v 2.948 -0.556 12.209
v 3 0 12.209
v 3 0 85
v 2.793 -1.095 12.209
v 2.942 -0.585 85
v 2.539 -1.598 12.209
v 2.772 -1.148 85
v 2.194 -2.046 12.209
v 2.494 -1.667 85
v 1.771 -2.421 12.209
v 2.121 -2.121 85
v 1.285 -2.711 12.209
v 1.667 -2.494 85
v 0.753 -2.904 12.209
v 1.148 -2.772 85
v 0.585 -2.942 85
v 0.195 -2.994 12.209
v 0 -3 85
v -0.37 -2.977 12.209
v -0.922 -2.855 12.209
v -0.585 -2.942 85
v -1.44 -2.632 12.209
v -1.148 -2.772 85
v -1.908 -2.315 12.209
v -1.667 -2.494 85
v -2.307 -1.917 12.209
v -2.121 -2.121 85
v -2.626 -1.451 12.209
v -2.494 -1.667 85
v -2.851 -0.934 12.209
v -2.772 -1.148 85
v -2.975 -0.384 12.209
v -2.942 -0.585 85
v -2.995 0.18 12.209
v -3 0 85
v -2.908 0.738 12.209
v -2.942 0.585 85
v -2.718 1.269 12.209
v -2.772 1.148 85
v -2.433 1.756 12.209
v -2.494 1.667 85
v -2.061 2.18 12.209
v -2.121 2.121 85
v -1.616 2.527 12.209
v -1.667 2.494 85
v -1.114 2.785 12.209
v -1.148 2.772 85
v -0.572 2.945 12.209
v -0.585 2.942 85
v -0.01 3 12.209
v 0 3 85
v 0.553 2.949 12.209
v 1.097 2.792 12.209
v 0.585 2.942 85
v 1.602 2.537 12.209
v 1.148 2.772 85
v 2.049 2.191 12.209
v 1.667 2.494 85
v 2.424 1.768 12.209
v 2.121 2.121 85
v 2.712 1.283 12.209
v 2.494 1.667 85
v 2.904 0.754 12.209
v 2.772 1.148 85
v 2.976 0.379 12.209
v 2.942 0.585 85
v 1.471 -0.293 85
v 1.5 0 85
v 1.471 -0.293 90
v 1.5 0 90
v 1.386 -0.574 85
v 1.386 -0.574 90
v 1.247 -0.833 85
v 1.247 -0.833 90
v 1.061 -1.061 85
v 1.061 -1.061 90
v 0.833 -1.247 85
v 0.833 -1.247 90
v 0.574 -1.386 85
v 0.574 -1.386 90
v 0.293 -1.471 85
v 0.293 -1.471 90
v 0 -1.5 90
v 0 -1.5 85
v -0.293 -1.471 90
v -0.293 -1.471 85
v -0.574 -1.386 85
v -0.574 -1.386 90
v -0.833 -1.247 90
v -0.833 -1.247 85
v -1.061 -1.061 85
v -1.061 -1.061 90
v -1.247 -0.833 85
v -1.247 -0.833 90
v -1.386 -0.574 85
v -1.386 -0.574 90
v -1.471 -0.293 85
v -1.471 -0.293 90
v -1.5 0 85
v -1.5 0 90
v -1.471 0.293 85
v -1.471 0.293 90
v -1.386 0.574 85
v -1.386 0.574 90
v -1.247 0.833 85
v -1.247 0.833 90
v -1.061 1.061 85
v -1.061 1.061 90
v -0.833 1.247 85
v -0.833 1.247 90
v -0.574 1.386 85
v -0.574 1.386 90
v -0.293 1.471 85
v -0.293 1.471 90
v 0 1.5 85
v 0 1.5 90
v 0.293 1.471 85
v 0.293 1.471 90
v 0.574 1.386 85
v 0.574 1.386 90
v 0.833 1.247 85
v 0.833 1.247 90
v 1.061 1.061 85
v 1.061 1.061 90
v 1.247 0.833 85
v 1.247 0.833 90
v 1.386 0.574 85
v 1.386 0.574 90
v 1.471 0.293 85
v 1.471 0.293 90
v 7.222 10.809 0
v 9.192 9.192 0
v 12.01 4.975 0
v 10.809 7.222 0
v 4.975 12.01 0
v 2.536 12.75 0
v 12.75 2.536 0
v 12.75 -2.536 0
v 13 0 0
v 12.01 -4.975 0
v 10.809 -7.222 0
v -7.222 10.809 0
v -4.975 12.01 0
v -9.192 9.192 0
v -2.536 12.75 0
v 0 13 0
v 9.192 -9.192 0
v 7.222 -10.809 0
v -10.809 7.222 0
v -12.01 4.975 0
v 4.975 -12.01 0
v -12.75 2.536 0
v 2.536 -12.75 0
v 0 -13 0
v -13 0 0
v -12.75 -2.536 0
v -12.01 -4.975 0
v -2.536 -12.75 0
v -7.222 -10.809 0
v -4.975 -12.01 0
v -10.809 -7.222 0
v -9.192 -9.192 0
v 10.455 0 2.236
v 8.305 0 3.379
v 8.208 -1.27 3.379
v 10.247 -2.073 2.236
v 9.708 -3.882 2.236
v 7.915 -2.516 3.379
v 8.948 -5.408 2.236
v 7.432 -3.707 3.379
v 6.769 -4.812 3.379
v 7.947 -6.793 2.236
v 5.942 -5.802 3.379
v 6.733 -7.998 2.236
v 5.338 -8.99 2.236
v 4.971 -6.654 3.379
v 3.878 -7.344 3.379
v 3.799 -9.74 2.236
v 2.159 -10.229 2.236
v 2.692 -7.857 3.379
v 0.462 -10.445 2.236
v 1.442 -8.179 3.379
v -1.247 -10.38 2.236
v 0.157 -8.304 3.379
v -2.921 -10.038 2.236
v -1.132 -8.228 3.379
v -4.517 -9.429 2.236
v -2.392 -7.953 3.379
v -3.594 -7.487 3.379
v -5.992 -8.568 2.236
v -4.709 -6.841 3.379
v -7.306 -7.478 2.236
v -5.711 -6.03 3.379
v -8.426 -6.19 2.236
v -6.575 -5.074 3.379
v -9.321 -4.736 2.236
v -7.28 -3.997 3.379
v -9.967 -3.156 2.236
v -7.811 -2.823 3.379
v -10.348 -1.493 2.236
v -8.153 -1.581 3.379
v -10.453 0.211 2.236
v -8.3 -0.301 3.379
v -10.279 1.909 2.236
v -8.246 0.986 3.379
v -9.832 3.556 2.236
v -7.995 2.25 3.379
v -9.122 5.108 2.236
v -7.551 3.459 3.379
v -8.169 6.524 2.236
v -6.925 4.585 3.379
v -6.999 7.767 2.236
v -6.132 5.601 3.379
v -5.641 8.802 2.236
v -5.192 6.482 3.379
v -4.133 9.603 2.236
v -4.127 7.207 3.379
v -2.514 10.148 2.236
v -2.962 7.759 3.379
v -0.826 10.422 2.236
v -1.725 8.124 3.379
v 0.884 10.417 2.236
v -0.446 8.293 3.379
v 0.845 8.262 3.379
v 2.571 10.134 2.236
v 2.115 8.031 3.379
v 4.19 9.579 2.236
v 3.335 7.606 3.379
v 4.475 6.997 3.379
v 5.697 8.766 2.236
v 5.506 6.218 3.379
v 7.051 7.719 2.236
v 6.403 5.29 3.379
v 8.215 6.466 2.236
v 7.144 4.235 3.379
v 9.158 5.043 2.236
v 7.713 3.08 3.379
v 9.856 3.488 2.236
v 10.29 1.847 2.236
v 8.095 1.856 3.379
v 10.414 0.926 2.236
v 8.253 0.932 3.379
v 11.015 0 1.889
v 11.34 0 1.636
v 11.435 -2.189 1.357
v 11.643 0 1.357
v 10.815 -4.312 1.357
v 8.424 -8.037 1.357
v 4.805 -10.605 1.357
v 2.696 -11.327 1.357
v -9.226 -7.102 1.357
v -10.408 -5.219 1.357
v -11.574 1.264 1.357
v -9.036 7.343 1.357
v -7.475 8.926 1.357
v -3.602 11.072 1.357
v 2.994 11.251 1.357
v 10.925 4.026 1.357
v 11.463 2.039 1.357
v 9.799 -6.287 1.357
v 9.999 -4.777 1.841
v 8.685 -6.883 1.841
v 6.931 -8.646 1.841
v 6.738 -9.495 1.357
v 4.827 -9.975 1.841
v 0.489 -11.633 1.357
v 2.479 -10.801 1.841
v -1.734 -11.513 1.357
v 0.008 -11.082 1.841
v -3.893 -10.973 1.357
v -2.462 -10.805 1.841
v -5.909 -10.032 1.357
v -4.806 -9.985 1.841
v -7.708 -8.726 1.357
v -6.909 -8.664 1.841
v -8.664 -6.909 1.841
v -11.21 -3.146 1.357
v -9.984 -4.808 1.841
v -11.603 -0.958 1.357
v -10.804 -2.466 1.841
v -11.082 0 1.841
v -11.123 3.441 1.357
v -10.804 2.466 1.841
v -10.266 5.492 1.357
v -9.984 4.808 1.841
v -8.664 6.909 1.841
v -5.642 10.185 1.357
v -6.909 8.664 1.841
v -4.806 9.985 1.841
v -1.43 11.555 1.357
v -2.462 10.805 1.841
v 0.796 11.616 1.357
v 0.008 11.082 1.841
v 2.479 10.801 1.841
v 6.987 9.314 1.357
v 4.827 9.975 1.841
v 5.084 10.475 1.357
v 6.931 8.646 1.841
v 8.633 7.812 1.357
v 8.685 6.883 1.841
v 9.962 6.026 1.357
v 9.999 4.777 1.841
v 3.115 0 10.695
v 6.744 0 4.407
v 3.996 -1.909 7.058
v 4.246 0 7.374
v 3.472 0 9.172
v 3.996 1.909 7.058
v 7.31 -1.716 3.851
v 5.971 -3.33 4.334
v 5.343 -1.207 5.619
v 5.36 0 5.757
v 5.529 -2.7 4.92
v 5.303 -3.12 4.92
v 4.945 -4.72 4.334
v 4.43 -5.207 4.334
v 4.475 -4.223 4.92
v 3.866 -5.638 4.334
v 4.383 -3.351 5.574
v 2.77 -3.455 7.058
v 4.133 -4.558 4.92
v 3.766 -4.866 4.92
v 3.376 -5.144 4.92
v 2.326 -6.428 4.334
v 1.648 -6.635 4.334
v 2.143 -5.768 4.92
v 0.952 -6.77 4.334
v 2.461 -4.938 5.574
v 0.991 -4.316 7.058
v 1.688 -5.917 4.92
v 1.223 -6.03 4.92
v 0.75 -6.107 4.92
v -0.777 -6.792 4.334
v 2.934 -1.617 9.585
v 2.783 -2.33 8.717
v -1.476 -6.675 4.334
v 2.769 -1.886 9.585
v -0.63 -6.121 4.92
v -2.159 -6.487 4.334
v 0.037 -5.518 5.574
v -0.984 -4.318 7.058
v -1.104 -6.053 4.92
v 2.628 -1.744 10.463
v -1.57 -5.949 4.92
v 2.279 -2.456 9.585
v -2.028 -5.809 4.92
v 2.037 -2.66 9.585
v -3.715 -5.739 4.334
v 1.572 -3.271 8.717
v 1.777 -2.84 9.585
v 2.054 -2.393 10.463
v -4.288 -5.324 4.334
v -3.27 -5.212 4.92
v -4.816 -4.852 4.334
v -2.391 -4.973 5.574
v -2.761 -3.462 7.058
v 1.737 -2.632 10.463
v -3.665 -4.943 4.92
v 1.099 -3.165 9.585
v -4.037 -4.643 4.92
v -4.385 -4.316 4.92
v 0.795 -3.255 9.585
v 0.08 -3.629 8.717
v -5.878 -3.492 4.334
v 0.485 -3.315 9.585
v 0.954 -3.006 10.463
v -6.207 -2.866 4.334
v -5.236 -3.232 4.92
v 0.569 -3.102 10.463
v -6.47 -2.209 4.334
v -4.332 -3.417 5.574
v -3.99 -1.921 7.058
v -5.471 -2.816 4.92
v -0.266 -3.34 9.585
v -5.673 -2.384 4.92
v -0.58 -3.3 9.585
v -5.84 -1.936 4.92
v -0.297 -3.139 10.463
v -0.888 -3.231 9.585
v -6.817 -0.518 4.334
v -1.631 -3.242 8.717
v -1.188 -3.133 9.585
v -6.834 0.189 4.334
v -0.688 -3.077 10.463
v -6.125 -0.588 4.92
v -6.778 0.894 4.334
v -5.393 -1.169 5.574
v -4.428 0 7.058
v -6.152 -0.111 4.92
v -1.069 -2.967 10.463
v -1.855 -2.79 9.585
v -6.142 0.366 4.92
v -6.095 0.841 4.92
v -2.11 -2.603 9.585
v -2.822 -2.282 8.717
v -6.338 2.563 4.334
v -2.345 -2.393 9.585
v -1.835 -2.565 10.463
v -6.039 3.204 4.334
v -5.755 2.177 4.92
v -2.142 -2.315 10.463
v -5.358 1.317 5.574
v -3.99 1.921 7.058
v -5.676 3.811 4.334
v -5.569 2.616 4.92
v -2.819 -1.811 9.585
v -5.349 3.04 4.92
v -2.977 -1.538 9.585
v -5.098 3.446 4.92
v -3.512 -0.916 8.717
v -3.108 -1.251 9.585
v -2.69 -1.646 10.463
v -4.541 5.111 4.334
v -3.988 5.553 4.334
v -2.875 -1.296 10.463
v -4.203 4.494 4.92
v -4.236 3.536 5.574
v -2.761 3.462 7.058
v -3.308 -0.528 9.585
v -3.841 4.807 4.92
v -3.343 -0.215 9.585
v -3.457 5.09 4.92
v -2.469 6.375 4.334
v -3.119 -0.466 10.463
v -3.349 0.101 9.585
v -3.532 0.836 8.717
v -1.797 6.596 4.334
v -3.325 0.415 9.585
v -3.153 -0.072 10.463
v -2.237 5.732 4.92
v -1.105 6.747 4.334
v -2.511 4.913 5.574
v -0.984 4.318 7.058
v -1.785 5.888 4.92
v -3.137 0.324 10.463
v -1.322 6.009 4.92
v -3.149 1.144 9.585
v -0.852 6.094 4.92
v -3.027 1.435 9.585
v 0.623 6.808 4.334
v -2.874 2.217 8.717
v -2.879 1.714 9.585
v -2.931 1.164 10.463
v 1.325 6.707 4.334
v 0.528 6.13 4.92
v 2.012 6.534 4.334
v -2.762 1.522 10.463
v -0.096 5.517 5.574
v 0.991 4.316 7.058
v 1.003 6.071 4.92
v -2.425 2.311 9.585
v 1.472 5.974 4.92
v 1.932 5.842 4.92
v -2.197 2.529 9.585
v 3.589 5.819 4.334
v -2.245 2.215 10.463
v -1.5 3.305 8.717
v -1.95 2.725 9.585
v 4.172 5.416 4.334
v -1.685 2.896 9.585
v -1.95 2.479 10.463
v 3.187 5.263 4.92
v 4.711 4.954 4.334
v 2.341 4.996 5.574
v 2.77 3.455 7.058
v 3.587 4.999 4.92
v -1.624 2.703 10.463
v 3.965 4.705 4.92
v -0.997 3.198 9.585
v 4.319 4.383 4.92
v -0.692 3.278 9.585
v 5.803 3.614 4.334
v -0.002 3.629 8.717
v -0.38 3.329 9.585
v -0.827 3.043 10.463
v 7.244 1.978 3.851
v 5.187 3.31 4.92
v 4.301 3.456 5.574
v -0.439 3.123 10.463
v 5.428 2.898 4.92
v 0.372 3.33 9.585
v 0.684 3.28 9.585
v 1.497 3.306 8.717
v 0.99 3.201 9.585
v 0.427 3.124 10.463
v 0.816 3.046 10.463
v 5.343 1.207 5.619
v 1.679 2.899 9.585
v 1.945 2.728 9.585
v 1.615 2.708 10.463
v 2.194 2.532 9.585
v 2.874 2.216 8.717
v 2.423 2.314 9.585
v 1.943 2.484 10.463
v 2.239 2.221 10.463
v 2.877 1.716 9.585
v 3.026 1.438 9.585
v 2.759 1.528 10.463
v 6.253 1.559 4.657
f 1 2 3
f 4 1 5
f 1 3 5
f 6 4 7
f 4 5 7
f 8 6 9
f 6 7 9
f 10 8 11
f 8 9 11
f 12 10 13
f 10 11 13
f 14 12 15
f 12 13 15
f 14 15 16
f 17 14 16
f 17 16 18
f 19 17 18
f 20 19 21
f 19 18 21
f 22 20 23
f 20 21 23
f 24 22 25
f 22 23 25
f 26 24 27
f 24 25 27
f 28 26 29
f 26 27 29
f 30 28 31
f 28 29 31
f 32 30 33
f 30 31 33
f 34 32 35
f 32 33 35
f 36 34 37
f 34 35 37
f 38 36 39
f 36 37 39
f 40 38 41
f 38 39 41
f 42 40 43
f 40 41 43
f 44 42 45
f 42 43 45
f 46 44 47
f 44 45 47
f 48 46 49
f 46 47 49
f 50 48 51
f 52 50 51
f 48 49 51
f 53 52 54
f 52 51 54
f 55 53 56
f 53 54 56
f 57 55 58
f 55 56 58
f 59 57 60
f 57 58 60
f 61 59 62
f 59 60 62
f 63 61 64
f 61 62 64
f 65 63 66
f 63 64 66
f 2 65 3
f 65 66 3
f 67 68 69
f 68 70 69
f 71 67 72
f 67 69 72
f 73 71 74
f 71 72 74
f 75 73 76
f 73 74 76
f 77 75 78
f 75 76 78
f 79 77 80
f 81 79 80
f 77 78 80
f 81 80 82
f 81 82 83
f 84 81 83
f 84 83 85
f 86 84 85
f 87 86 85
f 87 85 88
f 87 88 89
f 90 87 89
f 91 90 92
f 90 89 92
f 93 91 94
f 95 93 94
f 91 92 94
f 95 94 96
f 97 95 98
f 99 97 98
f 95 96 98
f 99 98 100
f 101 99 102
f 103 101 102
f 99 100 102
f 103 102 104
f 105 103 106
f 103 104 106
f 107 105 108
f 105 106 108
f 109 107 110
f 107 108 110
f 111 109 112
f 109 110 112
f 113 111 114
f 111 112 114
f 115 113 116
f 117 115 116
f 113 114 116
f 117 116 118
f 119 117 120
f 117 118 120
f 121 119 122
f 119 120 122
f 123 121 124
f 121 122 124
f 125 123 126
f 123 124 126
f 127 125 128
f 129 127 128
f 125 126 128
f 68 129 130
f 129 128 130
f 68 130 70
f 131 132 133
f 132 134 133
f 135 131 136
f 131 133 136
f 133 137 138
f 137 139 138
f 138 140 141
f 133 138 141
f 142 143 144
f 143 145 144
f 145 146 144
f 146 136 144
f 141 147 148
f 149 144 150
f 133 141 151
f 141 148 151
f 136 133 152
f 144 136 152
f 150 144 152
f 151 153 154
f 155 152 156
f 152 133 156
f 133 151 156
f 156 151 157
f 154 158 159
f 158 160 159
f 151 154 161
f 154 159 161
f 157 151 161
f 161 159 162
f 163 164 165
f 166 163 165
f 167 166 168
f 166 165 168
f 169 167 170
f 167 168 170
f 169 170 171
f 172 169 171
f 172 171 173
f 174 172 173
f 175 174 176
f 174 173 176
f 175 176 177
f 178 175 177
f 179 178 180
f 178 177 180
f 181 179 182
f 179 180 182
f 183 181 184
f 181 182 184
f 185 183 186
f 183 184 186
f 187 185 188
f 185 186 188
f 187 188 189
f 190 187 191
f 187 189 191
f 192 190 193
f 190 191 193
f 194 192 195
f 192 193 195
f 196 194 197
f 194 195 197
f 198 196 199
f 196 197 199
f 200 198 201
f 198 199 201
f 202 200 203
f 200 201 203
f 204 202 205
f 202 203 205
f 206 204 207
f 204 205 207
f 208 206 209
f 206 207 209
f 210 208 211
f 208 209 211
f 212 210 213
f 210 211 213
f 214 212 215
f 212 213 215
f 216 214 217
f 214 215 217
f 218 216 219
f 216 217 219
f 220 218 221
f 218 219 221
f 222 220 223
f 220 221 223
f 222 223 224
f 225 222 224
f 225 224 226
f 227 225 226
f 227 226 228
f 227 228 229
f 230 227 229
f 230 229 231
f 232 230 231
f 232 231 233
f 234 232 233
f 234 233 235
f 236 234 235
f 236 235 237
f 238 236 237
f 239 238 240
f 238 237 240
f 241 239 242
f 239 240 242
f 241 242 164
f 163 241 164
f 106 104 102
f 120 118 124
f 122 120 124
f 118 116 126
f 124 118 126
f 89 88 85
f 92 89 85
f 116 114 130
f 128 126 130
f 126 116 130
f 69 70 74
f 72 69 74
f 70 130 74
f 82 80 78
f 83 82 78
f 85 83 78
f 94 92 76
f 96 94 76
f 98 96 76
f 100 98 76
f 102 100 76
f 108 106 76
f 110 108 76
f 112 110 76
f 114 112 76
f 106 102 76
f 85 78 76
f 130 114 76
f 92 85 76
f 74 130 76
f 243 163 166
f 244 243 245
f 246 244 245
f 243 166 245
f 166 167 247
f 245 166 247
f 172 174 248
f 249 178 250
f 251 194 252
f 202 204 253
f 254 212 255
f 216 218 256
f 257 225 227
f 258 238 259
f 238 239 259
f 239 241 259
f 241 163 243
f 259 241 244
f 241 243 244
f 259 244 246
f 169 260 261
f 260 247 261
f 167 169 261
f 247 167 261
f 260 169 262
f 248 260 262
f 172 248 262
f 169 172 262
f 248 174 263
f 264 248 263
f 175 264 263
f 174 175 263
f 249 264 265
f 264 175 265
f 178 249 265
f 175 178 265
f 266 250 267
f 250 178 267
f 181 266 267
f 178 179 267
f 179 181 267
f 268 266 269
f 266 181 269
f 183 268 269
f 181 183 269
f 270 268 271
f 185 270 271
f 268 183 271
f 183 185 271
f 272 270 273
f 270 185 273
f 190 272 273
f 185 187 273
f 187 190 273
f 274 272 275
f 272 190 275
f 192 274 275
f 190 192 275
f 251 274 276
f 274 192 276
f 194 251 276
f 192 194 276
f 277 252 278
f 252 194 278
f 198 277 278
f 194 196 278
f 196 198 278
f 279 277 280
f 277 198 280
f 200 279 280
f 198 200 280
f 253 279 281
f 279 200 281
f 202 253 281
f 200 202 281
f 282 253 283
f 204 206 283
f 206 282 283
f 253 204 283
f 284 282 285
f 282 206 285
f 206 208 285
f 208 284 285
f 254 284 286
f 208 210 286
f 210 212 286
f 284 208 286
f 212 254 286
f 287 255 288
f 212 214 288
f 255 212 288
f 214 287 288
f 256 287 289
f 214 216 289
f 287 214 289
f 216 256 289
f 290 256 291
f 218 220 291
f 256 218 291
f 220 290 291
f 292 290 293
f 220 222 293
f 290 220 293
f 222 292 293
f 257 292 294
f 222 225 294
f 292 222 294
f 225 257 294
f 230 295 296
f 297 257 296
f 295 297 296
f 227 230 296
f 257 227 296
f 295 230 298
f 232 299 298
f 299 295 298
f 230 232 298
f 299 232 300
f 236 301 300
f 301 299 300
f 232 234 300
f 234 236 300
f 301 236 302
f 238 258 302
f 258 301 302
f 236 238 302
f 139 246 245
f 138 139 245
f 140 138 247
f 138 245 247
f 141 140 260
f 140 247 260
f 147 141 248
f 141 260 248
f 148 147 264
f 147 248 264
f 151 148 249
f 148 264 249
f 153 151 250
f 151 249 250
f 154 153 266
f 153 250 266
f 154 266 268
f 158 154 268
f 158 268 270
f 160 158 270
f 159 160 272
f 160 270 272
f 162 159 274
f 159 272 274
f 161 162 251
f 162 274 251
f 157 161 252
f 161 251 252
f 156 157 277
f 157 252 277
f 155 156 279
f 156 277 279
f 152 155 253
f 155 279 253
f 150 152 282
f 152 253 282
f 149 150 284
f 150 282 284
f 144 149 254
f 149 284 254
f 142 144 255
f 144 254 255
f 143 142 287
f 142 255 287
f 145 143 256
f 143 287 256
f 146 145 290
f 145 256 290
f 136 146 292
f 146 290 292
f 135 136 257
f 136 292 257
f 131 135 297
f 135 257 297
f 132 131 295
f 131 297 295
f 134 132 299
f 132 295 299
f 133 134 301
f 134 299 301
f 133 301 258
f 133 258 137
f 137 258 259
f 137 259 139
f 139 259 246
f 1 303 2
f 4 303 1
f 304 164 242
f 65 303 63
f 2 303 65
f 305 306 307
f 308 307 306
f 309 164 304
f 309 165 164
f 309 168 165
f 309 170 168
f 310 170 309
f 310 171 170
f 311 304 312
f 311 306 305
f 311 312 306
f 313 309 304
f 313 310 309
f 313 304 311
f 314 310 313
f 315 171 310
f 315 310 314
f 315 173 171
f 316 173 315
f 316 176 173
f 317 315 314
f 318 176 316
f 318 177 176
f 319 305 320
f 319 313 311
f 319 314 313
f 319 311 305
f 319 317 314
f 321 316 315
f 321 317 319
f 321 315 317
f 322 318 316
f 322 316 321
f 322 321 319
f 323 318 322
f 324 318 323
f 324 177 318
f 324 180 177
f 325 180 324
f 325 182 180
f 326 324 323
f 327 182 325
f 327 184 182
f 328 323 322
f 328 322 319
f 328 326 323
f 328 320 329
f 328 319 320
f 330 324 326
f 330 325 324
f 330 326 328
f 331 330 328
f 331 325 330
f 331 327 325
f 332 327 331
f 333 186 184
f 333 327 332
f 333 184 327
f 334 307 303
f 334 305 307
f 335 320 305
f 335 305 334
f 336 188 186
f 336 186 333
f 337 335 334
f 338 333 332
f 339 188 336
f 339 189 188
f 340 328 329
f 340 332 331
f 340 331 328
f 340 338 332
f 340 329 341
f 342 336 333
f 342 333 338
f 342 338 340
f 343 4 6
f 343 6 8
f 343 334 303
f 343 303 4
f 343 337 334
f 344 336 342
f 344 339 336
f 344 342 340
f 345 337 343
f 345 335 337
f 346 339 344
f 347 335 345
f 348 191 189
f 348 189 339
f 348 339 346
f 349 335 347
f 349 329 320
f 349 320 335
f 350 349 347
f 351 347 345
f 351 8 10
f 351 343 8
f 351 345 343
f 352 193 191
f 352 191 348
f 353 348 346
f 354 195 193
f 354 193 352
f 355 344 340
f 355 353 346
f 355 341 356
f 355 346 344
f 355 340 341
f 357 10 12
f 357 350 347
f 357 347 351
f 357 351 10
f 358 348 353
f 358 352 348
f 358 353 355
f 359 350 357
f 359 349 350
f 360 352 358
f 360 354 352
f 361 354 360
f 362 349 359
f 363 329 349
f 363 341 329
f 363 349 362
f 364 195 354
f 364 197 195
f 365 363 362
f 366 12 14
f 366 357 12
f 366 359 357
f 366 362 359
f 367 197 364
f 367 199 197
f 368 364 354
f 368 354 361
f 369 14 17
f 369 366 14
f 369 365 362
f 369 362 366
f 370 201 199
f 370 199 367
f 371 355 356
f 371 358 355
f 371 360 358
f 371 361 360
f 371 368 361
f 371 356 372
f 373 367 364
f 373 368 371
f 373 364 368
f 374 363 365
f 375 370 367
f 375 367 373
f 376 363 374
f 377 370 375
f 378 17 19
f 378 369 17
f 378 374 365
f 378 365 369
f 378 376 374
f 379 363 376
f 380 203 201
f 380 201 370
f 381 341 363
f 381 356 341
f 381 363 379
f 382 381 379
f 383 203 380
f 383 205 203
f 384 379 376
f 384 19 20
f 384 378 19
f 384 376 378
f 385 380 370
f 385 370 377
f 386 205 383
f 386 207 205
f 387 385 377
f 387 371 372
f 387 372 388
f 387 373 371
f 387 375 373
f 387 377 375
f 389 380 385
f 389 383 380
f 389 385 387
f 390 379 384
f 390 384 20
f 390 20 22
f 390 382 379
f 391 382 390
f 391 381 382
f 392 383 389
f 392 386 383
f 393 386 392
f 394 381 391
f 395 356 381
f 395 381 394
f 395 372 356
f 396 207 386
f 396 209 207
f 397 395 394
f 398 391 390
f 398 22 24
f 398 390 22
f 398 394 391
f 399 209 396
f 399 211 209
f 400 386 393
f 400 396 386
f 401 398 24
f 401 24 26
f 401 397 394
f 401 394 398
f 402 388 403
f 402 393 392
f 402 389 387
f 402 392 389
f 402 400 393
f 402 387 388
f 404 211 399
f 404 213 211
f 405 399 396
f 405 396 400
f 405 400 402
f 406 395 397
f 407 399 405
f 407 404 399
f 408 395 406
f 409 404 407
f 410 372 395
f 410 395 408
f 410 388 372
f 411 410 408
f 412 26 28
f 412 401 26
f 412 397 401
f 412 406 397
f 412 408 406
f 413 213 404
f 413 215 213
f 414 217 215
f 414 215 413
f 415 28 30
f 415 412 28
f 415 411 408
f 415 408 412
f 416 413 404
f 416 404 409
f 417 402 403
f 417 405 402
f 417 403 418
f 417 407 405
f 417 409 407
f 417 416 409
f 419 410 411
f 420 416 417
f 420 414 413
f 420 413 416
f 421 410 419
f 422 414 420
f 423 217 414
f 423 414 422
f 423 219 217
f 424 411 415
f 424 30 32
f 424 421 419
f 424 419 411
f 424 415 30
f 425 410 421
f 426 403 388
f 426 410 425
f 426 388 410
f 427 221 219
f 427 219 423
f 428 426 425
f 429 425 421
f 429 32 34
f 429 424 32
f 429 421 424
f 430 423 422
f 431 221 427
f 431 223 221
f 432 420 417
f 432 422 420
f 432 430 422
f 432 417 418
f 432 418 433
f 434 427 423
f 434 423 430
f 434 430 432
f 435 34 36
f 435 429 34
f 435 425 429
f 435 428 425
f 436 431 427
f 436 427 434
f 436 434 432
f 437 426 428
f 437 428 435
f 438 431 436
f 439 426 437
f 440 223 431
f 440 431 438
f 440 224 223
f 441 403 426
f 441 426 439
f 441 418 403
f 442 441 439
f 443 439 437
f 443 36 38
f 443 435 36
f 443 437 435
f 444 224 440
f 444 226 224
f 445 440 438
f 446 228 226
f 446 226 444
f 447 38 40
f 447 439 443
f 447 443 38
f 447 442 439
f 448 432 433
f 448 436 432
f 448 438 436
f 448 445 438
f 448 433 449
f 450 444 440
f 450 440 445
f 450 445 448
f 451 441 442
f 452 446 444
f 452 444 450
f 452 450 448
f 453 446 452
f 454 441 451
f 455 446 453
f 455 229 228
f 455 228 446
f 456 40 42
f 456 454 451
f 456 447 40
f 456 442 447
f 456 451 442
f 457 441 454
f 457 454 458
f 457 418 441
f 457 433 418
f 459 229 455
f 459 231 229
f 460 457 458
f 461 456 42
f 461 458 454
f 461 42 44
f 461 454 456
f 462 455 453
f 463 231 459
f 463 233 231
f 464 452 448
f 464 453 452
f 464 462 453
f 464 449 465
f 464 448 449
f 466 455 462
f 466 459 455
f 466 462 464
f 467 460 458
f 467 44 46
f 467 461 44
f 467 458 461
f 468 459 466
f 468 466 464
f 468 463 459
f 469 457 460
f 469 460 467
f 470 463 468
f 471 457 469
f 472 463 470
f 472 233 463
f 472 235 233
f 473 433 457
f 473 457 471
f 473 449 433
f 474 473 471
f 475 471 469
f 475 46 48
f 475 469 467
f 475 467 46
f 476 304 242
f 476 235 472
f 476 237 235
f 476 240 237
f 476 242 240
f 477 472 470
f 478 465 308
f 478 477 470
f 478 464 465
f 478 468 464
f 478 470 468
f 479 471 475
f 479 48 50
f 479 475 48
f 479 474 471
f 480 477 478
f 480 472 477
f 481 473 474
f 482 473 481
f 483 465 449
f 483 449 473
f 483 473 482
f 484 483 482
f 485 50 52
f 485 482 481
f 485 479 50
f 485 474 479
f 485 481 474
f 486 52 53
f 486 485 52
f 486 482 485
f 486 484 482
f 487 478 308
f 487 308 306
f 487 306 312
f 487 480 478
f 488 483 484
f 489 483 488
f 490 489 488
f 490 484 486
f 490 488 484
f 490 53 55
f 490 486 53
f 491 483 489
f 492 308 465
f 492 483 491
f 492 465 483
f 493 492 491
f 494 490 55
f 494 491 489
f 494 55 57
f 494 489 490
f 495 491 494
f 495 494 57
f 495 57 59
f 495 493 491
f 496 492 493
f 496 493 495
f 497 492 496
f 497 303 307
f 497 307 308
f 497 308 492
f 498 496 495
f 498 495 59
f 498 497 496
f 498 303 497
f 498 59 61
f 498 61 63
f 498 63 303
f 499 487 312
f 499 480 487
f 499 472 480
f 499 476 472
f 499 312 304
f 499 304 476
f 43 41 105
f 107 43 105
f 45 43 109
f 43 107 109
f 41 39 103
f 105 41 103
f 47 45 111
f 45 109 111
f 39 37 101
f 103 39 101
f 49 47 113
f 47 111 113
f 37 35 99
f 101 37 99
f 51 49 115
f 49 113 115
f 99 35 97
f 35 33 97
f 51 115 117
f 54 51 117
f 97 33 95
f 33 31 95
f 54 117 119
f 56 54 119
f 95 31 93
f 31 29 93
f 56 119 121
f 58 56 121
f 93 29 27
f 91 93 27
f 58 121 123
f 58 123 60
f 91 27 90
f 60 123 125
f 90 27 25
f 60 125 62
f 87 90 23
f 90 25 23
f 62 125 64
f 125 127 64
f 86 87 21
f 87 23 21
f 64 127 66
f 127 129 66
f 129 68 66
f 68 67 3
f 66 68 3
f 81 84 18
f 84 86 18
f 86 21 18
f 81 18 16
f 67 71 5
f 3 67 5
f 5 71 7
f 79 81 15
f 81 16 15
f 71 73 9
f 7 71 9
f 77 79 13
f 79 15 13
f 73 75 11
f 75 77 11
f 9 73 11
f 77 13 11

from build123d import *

# Parameters (mm, degrees)
F2_R = 10
F3_R = 5


with BuildPart() as f1:
    # F0 (on Front) → F1 (revolve)
    with BuildSketch(Plane.XZ):
        Polygon((0, 90), (0, 0), (13, 0), (11.11462, 1.88538), (3, 6.2), (3, 85), (1.5, 85), (1.5, 90), align=None)
    revolve(axis=Axis((0, 0, 45), (0, 0, -1)))

    # F2
    f2_edges = [f1.edges().sort_by_distance(p)[0] for p in [
        (-3, 0, 6.2),
    ]]
    fillet(f2_edges, radius=F2_R)

    # F3
    f3_edges = [f1.edges().sort_by_distance(p)[0] for p in [
        (-11.11462, 0, 1.88538),
    ]]
    fillet(f3_edges, radius=F3_R)


solid = f1.part
